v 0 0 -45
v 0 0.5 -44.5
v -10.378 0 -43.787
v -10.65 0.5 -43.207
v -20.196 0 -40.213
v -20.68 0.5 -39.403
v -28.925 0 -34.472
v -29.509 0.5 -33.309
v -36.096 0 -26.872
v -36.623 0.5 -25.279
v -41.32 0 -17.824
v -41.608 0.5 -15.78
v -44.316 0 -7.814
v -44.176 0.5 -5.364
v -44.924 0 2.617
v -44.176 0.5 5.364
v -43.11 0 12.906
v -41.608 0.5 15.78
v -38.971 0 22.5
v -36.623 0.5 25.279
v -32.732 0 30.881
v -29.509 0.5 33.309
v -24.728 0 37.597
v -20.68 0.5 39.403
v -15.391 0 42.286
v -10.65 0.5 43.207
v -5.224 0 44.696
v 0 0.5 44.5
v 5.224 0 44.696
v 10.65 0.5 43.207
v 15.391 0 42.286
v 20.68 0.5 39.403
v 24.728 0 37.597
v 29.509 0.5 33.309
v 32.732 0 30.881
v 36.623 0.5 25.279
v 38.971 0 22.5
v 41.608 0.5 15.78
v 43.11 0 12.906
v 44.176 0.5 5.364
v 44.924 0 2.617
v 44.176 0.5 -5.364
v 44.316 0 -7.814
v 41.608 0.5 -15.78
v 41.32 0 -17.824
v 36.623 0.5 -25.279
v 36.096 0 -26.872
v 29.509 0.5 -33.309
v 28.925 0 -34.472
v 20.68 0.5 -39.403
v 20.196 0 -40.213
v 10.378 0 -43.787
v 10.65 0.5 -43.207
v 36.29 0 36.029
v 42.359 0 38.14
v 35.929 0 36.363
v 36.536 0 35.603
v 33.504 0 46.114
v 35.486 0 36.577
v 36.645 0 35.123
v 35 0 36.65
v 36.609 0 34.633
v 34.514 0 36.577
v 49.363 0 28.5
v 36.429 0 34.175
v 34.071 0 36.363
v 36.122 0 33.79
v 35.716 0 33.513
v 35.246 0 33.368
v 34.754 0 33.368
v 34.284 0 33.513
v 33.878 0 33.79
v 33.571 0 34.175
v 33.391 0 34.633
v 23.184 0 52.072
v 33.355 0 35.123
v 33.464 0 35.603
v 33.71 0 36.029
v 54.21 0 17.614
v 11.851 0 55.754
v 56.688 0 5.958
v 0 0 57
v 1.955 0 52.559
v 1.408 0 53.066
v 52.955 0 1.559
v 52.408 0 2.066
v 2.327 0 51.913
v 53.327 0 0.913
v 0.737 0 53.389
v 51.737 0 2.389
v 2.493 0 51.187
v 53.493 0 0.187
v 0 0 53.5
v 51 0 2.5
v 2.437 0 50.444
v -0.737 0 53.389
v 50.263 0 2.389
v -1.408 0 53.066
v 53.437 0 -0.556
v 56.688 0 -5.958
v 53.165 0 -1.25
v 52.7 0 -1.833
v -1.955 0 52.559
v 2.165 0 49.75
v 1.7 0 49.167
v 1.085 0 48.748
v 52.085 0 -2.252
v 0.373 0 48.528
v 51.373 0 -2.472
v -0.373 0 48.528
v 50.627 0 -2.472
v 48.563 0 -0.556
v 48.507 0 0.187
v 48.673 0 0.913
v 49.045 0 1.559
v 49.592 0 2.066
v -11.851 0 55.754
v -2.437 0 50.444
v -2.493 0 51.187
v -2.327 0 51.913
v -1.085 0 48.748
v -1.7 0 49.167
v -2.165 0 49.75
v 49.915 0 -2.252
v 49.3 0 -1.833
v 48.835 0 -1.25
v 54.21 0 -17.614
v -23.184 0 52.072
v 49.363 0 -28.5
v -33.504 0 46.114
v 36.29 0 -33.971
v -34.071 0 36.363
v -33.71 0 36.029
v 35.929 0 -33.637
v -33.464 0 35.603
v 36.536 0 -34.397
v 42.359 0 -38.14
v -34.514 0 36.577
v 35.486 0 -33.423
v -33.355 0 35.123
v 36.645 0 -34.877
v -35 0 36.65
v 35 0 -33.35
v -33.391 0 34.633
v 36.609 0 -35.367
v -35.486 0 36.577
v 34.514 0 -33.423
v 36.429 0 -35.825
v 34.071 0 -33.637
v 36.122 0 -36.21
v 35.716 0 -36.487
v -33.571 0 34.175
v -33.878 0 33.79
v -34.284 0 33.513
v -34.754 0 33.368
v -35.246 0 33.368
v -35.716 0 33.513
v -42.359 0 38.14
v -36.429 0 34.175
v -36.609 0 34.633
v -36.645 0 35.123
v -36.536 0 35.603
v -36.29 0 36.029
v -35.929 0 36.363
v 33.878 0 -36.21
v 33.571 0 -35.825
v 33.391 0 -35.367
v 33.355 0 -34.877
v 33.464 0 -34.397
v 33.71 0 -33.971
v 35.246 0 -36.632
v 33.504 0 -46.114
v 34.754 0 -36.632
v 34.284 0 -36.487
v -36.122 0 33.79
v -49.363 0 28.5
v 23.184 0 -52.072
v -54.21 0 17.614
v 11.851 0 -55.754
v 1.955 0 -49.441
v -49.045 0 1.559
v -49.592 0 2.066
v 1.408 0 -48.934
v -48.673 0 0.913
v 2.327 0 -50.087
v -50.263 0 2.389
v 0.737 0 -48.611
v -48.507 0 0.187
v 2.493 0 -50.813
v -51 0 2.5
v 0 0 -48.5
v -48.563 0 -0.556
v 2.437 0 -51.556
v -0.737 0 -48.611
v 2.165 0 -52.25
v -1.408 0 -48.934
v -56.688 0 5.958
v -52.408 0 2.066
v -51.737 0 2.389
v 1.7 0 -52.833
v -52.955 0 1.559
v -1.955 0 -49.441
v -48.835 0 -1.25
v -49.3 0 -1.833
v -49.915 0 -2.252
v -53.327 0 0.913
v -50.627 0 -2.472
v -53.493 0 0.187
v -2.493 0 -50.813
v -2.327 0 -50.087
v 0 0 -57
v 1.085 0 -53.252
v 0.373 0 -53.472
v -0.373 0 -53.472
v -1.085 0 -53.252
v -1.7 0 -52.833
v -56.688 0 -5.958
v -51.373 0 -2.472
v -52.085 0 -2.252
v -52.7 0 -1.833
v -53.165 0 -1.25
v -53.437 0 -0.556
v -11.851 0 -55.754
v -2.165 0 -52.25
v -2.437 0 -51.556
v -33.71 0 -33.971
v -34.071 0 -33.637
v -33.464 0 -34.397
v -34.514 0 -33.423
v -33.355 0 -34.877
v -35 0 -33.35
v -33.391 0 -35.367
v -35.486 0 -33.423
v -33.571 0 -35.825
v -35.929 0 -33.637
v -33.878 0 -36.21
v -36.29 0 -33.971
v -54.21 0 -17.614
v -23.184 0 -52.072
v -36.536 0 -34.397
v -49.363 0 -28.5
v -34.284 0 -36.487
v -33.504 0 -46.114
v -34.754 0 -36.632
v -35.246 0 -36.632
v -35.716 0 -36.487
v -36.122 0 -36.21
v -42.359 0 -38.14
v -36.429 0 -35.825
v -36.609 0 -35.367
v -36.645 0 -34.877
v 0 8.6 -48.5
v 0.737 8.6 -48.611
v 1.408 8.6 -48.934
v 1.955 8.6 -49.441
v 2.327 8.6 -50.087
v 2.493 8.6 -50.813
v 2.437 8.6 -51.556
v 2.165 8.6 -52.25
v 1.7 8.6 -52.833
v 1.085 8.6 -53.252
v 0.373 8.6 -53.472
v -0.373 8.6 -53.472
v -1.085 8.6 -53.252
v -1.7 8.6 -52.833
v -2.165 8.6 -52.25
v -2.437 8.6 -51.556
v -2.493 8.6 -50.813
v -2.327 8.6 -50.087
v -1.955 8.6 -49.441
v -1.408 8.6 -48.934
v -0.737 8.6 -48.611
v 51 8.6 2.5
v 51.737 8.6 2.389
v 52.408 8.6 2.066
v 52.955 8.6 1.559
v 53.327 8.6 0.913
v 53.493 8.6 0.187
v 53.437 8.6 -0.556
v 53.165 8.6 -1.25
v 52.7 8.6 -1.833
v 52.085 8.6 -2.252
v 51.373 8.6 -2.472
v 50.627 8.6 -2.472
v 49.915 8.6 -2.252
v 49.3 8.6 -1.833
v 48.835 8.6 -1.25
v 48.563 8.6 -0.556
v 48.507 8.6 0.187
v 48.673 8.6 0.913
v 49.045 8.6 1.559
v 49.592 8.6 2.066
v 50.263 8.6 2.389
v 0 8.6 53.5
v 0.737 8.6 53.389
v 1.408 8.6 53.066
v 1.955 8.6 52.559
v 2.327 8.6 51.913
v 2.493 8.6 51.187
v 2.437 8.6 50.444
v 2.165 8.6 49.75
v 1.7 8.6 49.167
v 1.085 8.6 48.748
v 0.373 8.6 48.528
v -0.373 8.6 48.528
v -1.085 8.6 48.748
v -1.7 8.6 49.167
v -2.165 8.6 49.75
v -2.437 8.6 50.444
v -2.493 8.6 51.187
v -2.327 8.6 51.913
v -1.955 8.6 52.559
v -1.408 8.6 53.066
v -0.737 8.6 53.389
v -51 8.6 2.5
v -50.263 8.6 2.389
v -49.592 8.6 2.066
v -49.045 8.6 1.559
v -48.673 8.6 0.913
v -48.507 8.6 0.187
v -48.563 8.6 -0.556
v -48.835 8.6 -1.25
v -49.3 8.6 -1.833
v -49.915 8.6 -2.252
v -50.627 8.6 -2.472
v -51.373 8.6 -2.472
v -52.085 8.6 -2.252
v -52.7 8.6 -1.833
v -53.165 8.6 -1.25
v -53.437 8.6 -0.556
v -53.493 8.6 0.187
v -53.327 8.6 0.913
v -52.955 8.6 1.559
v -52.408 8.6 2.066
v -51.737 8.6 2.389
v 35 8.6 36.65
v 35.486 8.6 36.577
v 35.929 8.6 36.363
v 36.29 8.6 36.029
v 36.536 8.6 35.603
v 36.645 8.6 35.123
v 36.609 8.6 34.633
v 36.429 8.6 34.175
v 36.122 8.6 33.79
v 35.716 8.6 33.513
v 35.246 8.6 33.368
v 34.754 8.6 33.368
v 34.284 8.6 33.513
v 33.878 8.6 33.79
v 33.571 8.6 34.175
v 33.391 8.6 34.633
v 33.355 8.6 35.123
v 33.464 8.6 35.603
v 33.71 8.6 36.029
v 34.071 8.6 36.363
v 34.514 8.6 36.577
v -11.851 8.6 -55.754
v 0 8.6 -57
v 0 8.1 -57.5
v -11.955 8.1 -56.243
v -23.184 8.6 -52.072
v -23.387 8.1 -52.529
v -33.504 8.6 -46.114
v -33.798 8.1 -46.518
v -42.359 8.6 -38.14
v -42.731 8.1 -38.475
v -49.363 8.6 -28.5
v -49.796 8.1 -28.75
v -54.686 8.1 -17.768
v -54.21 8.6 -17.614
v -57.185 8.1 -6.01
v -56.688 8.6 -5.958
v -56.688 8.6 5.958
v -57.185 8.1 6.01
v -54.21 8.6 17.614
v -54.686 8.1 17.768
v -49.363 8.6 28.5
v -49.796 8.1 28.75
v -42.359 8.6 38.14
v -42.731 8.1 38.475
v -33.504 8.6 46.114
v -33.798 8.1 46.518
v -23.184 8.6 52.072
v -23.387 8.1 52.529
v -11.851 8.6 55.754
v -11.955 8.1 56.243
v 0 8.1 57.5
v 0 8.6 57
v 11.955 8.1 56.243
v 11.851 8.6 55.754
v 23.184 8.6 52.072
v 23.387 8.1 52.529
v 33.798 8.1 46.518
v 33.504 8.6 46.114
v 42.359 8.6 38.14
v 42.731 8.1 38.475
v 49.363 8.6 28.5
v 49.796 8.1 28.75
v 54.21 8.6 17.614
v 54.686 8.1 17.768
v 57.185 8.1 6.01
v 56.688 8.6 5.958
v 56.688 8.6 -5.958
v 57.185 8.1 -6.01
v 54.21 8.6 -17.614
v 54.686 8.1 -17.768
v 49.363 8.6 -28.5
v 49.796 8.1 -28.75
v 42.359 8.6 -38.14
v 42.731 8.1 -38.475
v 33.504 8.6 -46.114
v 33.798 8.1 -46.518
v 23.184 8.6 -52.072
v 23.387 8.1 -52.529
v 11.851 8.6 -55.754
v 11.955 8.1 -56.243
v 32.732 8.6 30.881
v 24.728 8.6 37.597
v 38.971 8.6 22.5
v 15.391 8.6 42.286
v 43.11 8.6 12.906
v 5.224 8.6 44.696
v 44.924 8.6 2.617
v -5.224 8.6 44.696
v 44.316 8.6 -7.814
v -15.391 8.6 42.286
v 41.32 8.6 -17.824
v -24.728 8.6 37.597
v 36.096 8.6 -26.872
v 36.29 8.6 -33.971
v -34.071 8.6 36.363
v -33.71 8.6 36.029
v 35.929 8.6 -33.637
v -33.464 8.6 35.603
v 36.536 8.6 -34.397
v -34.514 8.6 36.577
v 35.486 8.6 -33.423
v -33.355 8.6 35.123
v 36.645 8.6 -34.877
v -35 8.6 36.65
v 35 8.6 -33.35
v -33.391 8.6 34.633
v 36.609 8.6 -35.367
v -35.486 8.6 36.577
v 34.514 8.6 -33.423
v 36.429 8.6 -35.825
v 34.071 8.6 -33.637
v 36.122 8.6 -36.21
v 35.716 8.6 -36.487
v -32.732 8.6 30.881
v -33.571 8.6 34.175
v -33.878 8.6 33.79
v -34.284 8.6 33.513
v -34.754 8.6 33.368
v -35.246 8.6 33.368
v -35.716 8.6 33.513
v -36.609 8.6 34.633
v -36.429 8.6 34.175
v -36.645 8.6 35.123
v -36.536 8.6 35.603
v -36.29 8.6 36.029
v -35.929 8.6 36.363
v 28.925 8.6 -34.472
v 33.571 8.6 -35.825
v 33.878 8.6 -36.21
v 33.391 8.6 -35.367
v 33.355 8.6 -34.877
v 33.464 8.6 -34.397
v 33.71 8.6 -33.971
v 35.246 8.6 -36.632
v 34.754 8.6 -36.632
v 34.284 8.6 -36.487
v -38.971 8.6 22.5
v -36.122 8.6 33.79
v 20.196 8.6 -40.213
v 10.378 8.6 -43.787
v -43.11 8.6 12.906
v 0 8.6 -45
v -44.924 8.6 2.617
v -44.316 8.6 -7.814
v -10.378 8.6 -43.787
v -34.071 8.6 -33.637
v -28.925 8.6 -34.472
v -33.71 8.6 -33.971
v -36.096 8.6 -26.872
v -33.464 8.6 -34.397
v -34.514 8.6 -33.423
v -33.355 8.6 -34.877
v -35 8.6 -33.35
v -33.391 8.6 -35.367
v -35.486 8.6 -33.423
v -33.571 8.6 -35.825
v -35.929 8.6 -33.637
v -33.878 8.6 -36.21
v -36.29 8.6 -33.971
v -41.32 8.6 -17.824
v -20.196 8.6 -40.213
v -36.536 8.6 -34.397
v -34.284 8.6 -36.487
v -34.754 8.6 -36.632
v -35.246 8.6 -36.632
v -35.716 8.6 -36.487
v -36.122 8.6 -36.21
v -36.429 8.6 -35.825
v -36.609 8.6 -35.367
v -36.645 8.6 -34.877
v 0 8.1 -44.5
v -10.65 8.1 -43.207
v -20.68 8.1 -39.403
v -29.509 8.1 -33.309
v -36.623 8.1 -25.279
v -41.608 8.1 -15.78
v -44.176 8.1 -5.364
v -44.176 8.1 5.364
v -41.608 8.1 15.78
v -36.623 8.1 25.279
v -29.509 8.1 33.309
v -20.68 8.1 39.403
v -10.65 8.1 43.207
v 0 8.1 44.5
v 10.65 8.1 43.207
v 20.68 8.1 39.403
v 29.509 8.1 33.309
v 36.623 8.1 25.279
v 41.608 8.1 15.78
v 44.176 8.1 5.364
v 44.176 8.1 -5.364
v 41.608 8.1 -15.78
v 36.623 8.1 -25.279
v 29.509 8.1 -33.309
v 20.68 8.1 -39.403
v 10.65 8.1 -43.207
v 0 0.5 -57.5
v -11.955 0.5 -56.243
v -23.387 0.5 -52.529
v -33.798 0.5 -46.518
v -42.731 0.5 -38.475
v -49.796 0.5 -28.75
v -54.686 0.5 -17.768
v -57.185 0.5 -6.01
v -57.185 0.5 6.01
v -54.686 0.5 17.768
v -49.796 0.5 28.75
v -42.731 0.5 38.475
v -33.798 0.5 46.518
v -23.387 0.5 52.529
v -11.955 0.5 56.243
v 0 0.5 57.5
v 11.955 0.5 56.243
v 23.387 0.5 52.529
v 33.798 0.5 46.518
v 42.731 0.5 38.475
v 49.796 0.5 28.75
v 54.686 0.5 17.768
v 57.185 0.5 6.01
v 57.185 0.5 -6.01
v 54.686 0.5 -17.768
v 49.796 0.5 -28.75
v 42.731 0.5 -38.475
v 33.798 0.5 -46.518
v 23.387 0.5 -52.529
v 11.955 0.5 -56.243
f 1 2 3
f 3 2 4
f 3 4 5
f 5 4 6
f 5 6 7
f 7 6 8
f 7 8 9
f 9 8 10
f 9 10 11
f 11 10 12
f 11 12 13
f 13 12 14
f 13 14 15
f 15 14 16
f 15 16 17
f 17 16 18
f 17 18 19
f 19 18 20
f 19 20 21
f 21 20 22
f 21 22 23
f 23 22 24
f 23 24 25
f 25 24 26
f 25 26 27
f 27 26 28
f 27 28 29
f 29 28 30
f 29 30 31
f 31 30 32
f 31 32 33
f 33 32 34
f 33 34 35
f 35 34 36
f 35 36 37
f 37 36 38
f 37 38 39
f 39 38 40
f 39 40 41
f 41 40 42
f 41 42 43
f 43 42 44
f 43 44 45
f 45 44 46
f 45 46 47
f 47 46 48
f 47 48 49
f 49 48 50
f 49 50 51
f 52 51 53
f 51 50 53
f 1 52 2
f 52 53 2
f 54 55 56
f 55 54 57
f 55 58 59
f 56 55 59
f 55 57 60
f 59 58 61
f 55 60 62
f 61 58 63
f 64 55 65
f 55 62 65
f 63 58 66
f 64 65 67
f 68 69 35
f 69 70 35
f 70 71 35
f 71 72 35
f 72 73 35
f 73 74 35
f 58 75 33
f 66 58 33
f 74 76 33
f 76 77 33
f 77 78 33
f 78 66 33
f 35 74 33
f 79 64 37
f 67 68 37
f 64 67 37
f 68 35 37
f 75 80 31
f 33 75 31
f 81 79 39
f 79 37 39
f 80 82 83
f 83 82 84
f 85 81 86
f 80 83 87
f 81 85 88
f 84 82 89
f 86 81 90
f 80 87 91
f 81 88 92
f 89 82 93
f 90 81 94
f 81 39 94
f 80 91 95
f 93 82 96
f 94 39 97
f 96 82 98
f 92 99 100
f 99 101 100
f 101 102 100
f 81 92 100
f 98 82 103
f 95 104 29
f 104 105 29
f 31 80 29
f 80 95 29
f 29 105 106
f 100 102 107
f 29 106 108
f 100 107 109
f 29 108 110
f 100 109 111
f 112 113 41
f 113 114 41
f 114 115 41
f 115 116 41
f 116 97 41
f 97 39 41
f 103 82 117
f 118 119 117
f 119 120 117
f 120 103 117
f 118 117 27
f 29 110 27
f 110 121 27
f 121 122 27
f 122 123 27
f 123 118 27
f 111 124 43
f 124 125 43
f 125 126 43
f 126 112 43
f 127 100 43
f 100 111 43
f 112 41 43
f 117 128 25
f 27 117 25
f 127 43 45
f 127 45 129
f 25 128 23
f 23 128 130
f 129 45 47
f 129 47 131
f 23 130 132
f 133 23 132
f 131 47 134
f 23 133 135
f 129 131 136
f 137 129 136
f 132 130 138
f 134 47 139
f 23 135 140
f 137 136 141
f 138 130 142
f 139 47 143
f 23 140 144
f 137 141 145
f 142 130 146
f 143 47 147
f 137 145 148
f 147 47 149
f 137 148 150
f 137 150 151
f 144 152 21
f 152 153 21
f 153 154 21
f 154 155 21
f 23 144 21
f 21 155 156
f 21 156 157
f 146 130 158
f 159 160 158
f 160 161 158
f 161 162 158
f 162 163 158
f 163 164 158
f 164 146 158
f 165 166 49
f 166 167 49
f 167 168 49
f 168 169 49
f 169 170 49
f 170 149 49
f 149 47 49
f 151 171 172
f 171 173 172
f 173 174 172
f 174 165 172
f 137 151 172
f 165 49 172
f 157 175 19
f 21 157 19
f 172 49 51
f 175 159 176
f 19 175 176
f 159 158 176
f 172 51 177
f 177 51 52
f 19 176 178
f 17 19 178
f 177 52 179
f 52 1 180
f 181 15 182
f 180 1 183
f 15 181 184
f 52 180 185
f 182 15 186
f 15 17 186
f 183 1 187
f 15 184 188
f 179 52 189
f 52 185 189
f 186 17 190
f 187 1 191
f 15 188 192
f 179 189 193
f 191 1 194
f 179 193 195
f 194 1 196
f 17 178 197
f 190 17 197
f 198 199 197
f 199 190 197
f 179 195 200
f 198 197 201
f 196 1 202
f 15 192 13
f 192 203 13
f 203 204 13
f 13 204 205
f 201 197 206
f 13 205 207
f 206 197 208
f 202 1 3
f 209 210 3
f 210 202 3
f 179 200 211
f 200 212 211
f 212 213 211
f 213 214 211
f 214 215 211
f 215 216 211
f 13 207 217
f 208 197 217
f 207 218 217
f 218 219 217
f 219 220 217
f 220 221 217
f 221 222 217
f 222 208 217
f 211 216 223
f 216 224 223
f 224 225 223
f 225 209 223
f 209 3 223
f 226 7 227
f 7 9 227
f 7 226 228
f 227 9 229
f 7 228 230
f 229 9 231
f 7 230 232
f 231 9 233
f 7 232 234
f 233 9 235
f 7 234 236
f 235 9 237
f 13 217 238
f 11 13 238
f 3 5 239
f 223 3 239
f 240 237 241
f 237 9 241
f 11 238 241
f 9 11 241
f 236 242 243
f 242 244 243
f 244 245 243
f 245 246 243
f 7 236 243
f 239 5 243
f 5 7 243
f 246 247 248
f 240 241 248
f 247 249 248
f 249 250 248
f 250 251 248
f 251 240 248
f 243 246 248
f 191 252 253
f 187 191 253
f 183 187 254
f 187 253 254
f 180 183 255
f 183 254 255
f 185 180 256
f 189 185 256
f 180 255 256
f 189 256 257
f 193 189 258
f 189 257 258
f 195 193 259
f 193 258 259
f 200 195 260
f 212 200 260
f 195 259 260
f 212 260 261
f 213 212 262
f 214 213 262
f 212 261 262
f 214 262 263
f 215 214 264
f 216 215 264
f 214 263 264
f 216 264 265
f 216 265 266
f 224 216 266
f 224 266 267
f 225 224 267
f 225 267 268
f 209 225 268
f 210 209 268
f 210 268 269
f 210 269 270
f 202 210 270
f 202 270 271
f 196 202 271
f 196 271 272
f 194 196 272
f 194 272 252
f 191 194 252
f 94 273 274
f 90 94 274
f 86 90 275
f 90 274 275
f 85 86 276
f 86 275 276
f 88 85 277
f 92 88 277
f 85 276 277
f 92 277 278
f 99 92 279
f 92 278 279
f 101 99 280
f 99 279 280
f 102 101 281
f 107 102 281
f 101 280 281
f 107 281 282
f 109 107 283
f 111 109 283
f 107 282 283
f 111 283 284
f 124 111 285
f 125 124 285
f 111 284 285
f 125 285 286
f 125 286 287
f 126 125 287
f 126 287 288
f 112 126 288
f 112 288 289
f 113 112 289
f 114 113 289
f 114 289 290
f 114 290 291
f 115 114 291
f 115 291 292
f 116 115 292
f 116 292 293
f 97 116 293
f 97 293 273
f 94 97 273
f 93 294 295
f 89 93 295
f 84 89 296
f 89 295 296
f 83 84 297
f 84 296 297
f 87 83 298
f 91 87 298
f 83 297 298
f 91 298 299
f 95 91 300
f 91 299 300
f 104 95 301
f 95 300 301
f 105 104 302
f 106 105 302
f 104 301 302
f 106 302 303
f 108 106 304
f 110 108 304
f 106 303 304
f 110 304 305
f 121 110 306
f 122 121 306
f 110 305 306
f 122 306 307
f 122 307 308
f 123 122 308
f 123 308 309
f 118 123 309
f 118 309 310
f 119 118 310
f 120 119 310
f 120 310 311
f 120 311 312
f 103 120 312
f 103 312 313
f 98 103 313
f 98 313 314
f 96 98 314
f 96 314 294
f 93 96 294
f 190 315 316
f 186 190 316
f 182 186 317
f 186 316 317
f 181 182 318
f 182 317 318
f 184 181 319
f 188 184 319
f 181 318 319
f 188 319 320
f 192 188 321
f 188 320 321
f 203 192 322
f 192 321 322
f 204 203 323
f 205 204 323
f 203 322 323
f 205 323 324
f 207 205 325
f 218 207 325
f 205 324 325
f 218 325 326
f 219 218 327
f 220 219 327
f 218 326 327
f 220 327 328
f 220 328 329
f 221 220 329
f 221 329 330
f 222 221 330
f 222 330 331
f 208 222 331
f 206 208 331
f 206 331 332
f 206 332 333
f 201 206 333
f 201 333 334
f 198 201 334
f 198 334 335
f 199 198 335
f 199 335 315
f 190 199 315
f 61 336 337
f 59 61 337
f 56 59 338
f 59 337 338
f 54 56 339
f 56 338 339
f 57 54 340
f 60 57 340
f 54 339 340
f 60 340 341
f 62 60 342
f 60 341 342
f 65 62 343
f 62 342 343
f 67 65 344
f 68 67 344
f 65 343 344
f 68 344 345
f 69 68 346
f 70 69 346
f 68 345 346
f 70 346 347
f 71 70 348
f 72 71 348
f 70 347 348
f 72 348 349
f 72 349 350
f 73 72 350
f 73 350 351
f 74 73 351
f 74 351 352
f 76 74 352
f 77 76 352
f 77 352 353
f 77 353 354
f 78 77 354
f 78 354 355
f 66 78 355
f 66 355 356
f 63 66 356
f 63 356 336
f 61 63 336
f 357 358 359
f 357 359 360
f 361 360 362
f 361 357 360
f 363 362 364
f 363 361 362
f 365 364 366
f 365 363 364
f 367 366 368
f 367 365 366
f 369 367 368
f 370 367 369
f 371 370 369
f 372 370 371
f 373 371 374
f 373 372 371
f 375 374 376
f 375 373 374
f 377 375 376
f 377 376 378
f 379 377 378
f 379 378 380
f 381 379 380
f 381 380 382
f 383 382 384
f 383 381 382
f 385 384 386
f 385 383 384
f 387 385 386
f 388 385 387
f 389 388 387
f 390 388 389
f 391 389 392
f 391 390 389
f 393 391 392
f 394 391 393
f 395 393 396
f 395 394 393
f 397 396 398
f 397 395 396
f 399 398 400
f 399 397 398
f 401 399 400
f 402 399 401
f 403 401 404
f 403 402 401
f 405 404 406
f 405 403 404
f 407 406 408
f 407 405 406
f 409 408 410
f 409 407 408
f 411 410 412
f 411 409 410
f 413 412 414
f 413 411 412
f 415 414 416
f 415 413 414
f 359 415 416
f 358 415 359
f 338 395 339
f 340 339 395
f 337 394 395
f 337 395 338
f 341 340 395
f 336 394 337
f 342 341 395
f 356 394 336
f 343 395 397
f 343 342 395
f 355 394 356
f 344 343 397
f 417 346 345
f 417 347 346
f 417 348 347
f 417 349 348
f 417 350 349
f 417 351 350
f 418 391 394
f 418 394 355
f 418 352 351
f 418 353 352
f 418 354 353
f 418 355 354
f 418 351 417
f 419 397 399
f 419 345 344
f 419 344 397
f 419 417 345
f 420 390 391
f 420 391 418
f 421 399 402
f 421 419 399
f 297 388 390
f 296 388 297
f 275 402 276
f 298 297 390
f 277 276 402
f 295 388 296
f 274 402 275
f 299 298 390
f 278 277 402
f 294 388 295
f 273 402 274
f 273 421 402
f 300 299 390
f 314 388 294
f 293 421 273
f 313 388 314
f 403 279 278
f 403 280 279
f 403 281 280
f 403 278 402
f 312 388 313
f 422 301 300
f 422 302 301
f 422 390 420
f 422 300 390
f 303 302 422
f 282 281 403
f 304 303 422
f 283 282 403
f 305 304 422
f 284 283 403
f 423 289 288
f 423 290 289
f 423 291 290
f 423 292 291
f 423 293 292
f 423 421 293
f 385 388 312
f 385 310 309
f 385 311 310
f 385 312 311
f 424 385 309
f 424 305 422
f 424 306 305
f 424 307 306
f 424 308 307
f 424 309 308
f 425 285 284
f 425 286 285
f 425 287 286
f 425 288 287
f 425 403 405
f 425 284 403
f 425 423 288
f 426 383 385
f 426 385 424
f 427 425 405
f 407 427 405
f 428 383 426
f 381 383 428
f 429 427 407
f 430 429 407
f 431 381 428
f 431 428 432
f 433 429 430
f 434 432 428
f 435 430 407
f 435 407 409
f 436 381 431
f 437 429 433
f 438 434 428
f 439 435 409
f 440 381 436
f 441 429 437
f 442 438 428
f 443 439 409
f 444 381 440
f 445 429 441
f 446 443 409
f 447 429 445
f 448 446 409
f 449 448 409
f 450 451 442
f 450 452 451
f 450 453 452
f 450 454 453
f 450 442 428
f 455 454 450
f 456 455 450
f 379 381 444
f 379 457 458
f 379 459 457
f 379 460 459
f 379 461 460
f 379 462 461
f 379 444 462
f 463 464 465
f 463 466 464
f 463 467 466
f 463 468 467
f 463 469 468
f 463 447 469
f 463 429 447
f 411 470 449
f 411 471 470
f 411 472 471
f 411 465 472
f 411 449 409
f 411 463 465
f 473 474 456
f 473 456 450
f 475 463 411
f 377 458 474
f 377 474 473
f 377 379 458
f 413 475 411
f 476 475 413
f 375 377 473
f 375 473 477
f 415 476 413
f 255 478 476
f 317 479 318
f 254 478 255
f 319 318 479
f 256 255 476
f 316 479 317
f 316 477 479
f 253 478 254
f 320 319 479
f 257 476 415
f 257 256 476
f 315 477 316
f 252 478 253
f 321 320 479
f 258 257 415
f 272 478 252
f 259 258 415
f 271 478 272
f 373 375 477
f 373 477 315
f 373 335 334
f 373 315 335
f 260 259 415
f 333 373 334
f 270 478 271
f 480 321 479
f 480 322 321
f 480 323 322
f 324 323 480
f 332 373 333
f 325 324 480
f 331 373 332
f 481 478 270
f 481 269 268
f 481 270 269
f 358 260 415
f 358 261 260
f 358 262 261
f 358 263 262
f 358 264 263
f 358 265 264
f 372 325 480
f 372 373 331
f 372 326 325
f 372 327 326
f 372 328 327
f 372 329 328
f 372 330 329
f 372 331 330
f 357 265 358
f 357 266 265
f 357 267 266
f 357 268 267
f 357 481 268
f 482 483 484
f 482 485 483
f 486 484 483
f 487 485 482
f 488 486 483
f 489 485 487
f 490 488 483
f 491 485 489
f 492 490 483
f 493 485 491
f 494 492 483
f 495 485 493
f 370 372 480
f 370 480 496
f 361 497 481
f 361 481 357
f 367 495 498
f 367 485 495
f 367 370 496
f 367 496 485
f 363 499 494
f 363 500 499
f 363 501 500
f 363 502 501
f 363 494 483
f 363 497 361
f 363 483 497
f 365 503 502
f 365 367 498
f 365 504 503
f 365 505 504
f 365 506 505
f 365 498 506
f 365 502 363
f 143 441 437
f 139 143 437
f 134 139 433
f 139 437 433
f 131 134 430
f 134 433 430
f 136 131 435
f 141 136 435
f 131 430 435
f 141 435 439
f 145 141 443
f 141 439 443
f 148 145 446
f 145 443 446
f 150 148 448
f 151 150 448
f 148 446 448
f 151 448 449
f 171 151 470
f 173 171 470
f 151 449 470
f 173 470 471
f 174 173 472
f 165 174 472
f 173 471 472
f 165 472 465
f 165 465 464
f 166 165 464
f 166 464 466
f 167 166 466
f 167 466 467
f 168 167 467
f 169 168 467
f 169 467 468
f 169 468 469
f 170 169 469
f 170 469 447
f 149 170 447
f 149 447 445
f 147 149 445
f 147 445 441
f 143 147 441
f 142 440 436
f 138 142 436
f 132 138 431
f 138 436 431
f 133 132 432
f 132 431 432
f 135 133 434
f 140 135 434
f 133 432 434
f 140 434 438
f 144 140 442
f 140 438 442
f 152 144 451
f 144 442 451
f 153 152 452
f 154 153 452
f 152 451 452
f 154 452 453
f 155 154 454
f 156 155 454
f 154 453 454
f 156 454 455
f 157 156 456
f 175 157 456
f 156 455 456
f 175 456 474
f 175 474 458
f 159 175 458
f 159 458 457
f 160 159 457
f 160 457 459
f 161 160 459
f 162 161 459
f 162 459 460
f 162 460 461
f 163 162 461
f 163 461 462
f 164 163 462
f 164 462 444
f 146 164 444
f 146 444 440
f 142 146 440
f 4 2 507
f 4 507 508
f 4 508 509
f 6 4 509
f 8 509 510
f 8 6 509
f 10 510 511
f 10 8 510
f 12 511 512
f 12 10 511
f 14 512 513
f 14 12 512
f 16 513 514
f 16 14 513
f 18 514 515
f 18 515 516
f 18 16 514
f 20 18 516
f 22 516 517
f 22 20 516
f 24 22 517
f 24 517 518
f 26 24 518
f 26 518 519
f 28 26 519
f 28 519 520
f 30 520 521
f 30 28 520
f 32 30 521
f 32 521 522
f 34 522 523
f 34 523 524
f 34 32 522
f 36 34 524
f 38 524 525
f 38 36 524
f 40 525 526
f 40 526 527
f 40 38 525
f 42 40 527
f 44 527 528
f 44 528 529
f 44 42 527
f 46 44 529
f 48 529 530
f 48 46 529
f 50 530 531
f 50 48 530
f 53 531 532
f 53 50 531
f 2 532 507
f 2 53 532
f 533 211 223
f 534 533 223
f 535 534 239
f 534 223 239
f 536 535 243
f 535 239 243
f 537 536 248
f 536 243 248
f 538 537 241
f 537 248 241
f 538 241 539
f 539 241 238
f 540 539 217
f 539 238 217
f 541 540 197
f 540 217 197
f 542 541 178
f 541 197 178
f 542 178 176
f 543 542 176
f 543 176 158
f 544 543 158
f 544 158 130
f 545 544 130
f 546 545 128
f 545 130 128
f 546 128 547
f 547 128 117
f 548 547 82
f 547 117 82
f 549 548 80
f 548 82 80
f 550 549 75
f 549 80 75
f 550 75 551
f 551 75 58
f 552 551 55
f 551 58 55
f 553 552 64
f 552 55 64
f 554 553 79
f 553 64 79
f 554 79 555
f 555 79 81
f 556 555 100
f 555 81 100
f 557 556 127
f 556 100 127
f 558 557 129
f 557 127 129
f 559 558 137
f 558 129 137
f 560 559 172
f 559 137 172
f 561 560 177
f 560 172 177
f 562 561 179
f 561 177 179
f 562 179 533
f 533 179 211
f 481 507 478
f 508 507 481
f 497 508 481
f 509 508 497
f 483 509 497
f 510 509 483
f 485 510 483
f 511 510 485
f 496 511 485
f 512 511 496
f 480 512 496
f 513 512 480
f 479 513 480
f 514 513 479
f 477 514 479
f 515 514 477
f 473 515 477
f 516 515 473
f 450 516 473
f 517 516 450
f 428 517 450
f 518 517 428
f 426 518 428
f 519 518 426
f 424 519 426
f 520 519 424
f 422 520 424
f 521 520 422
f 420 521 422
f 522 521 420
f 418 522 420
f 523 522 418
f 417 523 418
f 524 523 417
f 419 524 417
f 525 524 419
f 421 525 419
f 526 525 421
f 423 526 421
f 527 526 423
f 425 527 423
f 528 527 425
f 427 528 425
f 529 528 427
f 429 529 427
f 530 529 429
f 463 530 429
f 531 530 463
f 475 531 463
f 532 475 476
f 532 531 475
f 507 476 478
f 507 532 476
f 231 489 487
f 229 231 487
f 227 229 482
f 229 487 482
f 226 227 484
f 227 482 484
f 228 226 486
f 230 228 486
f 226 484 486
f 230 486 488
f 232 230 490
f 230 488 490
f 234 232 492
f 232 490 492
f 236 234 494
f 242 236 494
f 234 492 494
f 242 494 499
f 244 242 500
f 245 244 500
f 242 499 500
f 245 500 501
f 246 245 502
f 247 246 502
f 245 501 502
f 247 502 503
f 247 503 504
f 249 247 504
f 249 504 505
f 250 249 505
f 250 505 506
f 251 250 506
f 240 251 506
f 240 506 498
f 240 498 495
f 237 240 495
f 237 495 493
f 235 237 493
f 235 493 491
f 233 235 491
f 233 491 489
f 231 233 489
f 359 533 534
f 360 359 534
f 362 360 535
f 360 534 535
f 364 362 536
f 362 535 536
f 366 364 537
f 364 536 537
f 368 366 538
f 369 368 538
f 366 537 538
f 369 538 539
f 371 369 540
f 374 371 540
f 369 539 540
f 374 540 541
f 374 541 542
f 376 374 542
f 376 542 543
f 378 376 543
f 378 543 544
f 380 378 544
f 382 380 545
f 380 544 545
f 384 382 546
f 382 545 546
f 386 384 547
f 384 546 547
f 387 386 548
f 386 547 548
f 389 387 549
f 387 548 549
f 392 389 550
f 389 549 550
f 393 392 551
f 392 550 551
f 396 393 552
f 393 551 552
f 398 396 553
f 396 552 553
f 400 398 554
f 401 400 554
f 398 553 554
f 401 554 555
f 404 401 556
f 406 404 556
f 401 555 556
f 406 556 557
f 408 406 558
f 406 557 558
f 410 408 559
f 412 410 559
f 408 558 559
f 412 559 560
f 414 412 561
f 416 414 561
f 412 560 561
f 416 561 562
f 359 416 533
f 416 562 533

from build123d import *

# Parameters (mm, degrees)
SKETCH_1_R          = 57.5
SKETCH_1_R_2        = 44.5
EXTRUDE_1_DEPTH     = 8.6
SKETCH_2_R          = 2.5
CUT_EXTRUDE_1_DEPTH = 82.770777176
CHAMFER_1_SIZE      = 0.5
SKETCH_3_R          = 1.65
CUT_EXTRUDE_2_DEPTH = 82.770777176


with BuildPart() as part:
    # ｽｹｯﾁ1 → ﾎﾞｽ - 押し出し1 (new body)
    with BuildSketch(Plane(origin=(0, 0, 0), x_dir=(1, 0, 0), z_dir=(0, 1, 0))):
        with Locations(Location((0, 0, 0), (0, 0, 90))):
            Circle(SKETCH_1_R)
        with Locations(Location((0, 0, 0), (0, 0, 90))):
            Circle(SKETCH_1_R_2, mode=Mode.SUBTRACT)
    extrude(amount=EXTRUDE_1_DEPTH)

    # ｽｹｯﾁ2 → ｶｯﾄ - 押し出し1 (cut, through all)
    with BuildSketch(Plane(origin=(0, 8.6, 0), x_dir=(1, 0, 0), z_dir=(0, 1, 0))):
        with Locations(Location((-51, 0, 0), (0, 0, 270))):
            Circle(SKETCH_2_R)
        with Locations(Location((0, 51, 0), (0, 0, 270))):
            Circle(SKETCH_2_R)
        with Locations(Location((51, 0, 0), (0, 0, 270))):
            Circle(SKETCH_2_R)
        with Locations(Location((0, -51, 0), (0, 0, 270))):
            Circle(SKETCH_2_R)
    extrude(amount=-CUT_EXTRUDE_1_DEPTH, mode=Mode.SUBTRACT)

    # 面取り1
    chamfer_1_edges = [part.edges().sort_by_distance(p)[0] for p in [
        (0, 0, 57.5),
        (0, 8.6, 57.5),
        (0, 0, 44.5),
        (0, 8.6, 44.5),
    ]]
    chamfer(chamfer_1_edges, length=CHAMFER_1_SIZE)

    # ｽｹｯﾁ3 → ｶｯﾄ - 押し出し2 (cut, through all)
    with BuildSketch(Plane(origin=(0, 8.6, 0), x_dir=(1, 0, 0), z_dir=(0, 1, 0))):
        with Locations(Location((-35, 35, 0), (0, 0, 270))):
            Circle(SKETCH_3_R)
        with Locations(Location((-35, -35, 0), (0, 0, 270))):
            Circle(SKETCH_3_R)
        with Locations(Location((35, -35, 0), (0, 0, 270))):
            Circle(SKETCH_3_R)
        with Locations(Location((35, 35, 0), (0, 0, 270))):
            Circle(SKETCH_3_R)
    extrude(amount=-CUT_EXTRUDE_2_DEPTH, mode=Mode.SUBTRACT)


solid = part.part
